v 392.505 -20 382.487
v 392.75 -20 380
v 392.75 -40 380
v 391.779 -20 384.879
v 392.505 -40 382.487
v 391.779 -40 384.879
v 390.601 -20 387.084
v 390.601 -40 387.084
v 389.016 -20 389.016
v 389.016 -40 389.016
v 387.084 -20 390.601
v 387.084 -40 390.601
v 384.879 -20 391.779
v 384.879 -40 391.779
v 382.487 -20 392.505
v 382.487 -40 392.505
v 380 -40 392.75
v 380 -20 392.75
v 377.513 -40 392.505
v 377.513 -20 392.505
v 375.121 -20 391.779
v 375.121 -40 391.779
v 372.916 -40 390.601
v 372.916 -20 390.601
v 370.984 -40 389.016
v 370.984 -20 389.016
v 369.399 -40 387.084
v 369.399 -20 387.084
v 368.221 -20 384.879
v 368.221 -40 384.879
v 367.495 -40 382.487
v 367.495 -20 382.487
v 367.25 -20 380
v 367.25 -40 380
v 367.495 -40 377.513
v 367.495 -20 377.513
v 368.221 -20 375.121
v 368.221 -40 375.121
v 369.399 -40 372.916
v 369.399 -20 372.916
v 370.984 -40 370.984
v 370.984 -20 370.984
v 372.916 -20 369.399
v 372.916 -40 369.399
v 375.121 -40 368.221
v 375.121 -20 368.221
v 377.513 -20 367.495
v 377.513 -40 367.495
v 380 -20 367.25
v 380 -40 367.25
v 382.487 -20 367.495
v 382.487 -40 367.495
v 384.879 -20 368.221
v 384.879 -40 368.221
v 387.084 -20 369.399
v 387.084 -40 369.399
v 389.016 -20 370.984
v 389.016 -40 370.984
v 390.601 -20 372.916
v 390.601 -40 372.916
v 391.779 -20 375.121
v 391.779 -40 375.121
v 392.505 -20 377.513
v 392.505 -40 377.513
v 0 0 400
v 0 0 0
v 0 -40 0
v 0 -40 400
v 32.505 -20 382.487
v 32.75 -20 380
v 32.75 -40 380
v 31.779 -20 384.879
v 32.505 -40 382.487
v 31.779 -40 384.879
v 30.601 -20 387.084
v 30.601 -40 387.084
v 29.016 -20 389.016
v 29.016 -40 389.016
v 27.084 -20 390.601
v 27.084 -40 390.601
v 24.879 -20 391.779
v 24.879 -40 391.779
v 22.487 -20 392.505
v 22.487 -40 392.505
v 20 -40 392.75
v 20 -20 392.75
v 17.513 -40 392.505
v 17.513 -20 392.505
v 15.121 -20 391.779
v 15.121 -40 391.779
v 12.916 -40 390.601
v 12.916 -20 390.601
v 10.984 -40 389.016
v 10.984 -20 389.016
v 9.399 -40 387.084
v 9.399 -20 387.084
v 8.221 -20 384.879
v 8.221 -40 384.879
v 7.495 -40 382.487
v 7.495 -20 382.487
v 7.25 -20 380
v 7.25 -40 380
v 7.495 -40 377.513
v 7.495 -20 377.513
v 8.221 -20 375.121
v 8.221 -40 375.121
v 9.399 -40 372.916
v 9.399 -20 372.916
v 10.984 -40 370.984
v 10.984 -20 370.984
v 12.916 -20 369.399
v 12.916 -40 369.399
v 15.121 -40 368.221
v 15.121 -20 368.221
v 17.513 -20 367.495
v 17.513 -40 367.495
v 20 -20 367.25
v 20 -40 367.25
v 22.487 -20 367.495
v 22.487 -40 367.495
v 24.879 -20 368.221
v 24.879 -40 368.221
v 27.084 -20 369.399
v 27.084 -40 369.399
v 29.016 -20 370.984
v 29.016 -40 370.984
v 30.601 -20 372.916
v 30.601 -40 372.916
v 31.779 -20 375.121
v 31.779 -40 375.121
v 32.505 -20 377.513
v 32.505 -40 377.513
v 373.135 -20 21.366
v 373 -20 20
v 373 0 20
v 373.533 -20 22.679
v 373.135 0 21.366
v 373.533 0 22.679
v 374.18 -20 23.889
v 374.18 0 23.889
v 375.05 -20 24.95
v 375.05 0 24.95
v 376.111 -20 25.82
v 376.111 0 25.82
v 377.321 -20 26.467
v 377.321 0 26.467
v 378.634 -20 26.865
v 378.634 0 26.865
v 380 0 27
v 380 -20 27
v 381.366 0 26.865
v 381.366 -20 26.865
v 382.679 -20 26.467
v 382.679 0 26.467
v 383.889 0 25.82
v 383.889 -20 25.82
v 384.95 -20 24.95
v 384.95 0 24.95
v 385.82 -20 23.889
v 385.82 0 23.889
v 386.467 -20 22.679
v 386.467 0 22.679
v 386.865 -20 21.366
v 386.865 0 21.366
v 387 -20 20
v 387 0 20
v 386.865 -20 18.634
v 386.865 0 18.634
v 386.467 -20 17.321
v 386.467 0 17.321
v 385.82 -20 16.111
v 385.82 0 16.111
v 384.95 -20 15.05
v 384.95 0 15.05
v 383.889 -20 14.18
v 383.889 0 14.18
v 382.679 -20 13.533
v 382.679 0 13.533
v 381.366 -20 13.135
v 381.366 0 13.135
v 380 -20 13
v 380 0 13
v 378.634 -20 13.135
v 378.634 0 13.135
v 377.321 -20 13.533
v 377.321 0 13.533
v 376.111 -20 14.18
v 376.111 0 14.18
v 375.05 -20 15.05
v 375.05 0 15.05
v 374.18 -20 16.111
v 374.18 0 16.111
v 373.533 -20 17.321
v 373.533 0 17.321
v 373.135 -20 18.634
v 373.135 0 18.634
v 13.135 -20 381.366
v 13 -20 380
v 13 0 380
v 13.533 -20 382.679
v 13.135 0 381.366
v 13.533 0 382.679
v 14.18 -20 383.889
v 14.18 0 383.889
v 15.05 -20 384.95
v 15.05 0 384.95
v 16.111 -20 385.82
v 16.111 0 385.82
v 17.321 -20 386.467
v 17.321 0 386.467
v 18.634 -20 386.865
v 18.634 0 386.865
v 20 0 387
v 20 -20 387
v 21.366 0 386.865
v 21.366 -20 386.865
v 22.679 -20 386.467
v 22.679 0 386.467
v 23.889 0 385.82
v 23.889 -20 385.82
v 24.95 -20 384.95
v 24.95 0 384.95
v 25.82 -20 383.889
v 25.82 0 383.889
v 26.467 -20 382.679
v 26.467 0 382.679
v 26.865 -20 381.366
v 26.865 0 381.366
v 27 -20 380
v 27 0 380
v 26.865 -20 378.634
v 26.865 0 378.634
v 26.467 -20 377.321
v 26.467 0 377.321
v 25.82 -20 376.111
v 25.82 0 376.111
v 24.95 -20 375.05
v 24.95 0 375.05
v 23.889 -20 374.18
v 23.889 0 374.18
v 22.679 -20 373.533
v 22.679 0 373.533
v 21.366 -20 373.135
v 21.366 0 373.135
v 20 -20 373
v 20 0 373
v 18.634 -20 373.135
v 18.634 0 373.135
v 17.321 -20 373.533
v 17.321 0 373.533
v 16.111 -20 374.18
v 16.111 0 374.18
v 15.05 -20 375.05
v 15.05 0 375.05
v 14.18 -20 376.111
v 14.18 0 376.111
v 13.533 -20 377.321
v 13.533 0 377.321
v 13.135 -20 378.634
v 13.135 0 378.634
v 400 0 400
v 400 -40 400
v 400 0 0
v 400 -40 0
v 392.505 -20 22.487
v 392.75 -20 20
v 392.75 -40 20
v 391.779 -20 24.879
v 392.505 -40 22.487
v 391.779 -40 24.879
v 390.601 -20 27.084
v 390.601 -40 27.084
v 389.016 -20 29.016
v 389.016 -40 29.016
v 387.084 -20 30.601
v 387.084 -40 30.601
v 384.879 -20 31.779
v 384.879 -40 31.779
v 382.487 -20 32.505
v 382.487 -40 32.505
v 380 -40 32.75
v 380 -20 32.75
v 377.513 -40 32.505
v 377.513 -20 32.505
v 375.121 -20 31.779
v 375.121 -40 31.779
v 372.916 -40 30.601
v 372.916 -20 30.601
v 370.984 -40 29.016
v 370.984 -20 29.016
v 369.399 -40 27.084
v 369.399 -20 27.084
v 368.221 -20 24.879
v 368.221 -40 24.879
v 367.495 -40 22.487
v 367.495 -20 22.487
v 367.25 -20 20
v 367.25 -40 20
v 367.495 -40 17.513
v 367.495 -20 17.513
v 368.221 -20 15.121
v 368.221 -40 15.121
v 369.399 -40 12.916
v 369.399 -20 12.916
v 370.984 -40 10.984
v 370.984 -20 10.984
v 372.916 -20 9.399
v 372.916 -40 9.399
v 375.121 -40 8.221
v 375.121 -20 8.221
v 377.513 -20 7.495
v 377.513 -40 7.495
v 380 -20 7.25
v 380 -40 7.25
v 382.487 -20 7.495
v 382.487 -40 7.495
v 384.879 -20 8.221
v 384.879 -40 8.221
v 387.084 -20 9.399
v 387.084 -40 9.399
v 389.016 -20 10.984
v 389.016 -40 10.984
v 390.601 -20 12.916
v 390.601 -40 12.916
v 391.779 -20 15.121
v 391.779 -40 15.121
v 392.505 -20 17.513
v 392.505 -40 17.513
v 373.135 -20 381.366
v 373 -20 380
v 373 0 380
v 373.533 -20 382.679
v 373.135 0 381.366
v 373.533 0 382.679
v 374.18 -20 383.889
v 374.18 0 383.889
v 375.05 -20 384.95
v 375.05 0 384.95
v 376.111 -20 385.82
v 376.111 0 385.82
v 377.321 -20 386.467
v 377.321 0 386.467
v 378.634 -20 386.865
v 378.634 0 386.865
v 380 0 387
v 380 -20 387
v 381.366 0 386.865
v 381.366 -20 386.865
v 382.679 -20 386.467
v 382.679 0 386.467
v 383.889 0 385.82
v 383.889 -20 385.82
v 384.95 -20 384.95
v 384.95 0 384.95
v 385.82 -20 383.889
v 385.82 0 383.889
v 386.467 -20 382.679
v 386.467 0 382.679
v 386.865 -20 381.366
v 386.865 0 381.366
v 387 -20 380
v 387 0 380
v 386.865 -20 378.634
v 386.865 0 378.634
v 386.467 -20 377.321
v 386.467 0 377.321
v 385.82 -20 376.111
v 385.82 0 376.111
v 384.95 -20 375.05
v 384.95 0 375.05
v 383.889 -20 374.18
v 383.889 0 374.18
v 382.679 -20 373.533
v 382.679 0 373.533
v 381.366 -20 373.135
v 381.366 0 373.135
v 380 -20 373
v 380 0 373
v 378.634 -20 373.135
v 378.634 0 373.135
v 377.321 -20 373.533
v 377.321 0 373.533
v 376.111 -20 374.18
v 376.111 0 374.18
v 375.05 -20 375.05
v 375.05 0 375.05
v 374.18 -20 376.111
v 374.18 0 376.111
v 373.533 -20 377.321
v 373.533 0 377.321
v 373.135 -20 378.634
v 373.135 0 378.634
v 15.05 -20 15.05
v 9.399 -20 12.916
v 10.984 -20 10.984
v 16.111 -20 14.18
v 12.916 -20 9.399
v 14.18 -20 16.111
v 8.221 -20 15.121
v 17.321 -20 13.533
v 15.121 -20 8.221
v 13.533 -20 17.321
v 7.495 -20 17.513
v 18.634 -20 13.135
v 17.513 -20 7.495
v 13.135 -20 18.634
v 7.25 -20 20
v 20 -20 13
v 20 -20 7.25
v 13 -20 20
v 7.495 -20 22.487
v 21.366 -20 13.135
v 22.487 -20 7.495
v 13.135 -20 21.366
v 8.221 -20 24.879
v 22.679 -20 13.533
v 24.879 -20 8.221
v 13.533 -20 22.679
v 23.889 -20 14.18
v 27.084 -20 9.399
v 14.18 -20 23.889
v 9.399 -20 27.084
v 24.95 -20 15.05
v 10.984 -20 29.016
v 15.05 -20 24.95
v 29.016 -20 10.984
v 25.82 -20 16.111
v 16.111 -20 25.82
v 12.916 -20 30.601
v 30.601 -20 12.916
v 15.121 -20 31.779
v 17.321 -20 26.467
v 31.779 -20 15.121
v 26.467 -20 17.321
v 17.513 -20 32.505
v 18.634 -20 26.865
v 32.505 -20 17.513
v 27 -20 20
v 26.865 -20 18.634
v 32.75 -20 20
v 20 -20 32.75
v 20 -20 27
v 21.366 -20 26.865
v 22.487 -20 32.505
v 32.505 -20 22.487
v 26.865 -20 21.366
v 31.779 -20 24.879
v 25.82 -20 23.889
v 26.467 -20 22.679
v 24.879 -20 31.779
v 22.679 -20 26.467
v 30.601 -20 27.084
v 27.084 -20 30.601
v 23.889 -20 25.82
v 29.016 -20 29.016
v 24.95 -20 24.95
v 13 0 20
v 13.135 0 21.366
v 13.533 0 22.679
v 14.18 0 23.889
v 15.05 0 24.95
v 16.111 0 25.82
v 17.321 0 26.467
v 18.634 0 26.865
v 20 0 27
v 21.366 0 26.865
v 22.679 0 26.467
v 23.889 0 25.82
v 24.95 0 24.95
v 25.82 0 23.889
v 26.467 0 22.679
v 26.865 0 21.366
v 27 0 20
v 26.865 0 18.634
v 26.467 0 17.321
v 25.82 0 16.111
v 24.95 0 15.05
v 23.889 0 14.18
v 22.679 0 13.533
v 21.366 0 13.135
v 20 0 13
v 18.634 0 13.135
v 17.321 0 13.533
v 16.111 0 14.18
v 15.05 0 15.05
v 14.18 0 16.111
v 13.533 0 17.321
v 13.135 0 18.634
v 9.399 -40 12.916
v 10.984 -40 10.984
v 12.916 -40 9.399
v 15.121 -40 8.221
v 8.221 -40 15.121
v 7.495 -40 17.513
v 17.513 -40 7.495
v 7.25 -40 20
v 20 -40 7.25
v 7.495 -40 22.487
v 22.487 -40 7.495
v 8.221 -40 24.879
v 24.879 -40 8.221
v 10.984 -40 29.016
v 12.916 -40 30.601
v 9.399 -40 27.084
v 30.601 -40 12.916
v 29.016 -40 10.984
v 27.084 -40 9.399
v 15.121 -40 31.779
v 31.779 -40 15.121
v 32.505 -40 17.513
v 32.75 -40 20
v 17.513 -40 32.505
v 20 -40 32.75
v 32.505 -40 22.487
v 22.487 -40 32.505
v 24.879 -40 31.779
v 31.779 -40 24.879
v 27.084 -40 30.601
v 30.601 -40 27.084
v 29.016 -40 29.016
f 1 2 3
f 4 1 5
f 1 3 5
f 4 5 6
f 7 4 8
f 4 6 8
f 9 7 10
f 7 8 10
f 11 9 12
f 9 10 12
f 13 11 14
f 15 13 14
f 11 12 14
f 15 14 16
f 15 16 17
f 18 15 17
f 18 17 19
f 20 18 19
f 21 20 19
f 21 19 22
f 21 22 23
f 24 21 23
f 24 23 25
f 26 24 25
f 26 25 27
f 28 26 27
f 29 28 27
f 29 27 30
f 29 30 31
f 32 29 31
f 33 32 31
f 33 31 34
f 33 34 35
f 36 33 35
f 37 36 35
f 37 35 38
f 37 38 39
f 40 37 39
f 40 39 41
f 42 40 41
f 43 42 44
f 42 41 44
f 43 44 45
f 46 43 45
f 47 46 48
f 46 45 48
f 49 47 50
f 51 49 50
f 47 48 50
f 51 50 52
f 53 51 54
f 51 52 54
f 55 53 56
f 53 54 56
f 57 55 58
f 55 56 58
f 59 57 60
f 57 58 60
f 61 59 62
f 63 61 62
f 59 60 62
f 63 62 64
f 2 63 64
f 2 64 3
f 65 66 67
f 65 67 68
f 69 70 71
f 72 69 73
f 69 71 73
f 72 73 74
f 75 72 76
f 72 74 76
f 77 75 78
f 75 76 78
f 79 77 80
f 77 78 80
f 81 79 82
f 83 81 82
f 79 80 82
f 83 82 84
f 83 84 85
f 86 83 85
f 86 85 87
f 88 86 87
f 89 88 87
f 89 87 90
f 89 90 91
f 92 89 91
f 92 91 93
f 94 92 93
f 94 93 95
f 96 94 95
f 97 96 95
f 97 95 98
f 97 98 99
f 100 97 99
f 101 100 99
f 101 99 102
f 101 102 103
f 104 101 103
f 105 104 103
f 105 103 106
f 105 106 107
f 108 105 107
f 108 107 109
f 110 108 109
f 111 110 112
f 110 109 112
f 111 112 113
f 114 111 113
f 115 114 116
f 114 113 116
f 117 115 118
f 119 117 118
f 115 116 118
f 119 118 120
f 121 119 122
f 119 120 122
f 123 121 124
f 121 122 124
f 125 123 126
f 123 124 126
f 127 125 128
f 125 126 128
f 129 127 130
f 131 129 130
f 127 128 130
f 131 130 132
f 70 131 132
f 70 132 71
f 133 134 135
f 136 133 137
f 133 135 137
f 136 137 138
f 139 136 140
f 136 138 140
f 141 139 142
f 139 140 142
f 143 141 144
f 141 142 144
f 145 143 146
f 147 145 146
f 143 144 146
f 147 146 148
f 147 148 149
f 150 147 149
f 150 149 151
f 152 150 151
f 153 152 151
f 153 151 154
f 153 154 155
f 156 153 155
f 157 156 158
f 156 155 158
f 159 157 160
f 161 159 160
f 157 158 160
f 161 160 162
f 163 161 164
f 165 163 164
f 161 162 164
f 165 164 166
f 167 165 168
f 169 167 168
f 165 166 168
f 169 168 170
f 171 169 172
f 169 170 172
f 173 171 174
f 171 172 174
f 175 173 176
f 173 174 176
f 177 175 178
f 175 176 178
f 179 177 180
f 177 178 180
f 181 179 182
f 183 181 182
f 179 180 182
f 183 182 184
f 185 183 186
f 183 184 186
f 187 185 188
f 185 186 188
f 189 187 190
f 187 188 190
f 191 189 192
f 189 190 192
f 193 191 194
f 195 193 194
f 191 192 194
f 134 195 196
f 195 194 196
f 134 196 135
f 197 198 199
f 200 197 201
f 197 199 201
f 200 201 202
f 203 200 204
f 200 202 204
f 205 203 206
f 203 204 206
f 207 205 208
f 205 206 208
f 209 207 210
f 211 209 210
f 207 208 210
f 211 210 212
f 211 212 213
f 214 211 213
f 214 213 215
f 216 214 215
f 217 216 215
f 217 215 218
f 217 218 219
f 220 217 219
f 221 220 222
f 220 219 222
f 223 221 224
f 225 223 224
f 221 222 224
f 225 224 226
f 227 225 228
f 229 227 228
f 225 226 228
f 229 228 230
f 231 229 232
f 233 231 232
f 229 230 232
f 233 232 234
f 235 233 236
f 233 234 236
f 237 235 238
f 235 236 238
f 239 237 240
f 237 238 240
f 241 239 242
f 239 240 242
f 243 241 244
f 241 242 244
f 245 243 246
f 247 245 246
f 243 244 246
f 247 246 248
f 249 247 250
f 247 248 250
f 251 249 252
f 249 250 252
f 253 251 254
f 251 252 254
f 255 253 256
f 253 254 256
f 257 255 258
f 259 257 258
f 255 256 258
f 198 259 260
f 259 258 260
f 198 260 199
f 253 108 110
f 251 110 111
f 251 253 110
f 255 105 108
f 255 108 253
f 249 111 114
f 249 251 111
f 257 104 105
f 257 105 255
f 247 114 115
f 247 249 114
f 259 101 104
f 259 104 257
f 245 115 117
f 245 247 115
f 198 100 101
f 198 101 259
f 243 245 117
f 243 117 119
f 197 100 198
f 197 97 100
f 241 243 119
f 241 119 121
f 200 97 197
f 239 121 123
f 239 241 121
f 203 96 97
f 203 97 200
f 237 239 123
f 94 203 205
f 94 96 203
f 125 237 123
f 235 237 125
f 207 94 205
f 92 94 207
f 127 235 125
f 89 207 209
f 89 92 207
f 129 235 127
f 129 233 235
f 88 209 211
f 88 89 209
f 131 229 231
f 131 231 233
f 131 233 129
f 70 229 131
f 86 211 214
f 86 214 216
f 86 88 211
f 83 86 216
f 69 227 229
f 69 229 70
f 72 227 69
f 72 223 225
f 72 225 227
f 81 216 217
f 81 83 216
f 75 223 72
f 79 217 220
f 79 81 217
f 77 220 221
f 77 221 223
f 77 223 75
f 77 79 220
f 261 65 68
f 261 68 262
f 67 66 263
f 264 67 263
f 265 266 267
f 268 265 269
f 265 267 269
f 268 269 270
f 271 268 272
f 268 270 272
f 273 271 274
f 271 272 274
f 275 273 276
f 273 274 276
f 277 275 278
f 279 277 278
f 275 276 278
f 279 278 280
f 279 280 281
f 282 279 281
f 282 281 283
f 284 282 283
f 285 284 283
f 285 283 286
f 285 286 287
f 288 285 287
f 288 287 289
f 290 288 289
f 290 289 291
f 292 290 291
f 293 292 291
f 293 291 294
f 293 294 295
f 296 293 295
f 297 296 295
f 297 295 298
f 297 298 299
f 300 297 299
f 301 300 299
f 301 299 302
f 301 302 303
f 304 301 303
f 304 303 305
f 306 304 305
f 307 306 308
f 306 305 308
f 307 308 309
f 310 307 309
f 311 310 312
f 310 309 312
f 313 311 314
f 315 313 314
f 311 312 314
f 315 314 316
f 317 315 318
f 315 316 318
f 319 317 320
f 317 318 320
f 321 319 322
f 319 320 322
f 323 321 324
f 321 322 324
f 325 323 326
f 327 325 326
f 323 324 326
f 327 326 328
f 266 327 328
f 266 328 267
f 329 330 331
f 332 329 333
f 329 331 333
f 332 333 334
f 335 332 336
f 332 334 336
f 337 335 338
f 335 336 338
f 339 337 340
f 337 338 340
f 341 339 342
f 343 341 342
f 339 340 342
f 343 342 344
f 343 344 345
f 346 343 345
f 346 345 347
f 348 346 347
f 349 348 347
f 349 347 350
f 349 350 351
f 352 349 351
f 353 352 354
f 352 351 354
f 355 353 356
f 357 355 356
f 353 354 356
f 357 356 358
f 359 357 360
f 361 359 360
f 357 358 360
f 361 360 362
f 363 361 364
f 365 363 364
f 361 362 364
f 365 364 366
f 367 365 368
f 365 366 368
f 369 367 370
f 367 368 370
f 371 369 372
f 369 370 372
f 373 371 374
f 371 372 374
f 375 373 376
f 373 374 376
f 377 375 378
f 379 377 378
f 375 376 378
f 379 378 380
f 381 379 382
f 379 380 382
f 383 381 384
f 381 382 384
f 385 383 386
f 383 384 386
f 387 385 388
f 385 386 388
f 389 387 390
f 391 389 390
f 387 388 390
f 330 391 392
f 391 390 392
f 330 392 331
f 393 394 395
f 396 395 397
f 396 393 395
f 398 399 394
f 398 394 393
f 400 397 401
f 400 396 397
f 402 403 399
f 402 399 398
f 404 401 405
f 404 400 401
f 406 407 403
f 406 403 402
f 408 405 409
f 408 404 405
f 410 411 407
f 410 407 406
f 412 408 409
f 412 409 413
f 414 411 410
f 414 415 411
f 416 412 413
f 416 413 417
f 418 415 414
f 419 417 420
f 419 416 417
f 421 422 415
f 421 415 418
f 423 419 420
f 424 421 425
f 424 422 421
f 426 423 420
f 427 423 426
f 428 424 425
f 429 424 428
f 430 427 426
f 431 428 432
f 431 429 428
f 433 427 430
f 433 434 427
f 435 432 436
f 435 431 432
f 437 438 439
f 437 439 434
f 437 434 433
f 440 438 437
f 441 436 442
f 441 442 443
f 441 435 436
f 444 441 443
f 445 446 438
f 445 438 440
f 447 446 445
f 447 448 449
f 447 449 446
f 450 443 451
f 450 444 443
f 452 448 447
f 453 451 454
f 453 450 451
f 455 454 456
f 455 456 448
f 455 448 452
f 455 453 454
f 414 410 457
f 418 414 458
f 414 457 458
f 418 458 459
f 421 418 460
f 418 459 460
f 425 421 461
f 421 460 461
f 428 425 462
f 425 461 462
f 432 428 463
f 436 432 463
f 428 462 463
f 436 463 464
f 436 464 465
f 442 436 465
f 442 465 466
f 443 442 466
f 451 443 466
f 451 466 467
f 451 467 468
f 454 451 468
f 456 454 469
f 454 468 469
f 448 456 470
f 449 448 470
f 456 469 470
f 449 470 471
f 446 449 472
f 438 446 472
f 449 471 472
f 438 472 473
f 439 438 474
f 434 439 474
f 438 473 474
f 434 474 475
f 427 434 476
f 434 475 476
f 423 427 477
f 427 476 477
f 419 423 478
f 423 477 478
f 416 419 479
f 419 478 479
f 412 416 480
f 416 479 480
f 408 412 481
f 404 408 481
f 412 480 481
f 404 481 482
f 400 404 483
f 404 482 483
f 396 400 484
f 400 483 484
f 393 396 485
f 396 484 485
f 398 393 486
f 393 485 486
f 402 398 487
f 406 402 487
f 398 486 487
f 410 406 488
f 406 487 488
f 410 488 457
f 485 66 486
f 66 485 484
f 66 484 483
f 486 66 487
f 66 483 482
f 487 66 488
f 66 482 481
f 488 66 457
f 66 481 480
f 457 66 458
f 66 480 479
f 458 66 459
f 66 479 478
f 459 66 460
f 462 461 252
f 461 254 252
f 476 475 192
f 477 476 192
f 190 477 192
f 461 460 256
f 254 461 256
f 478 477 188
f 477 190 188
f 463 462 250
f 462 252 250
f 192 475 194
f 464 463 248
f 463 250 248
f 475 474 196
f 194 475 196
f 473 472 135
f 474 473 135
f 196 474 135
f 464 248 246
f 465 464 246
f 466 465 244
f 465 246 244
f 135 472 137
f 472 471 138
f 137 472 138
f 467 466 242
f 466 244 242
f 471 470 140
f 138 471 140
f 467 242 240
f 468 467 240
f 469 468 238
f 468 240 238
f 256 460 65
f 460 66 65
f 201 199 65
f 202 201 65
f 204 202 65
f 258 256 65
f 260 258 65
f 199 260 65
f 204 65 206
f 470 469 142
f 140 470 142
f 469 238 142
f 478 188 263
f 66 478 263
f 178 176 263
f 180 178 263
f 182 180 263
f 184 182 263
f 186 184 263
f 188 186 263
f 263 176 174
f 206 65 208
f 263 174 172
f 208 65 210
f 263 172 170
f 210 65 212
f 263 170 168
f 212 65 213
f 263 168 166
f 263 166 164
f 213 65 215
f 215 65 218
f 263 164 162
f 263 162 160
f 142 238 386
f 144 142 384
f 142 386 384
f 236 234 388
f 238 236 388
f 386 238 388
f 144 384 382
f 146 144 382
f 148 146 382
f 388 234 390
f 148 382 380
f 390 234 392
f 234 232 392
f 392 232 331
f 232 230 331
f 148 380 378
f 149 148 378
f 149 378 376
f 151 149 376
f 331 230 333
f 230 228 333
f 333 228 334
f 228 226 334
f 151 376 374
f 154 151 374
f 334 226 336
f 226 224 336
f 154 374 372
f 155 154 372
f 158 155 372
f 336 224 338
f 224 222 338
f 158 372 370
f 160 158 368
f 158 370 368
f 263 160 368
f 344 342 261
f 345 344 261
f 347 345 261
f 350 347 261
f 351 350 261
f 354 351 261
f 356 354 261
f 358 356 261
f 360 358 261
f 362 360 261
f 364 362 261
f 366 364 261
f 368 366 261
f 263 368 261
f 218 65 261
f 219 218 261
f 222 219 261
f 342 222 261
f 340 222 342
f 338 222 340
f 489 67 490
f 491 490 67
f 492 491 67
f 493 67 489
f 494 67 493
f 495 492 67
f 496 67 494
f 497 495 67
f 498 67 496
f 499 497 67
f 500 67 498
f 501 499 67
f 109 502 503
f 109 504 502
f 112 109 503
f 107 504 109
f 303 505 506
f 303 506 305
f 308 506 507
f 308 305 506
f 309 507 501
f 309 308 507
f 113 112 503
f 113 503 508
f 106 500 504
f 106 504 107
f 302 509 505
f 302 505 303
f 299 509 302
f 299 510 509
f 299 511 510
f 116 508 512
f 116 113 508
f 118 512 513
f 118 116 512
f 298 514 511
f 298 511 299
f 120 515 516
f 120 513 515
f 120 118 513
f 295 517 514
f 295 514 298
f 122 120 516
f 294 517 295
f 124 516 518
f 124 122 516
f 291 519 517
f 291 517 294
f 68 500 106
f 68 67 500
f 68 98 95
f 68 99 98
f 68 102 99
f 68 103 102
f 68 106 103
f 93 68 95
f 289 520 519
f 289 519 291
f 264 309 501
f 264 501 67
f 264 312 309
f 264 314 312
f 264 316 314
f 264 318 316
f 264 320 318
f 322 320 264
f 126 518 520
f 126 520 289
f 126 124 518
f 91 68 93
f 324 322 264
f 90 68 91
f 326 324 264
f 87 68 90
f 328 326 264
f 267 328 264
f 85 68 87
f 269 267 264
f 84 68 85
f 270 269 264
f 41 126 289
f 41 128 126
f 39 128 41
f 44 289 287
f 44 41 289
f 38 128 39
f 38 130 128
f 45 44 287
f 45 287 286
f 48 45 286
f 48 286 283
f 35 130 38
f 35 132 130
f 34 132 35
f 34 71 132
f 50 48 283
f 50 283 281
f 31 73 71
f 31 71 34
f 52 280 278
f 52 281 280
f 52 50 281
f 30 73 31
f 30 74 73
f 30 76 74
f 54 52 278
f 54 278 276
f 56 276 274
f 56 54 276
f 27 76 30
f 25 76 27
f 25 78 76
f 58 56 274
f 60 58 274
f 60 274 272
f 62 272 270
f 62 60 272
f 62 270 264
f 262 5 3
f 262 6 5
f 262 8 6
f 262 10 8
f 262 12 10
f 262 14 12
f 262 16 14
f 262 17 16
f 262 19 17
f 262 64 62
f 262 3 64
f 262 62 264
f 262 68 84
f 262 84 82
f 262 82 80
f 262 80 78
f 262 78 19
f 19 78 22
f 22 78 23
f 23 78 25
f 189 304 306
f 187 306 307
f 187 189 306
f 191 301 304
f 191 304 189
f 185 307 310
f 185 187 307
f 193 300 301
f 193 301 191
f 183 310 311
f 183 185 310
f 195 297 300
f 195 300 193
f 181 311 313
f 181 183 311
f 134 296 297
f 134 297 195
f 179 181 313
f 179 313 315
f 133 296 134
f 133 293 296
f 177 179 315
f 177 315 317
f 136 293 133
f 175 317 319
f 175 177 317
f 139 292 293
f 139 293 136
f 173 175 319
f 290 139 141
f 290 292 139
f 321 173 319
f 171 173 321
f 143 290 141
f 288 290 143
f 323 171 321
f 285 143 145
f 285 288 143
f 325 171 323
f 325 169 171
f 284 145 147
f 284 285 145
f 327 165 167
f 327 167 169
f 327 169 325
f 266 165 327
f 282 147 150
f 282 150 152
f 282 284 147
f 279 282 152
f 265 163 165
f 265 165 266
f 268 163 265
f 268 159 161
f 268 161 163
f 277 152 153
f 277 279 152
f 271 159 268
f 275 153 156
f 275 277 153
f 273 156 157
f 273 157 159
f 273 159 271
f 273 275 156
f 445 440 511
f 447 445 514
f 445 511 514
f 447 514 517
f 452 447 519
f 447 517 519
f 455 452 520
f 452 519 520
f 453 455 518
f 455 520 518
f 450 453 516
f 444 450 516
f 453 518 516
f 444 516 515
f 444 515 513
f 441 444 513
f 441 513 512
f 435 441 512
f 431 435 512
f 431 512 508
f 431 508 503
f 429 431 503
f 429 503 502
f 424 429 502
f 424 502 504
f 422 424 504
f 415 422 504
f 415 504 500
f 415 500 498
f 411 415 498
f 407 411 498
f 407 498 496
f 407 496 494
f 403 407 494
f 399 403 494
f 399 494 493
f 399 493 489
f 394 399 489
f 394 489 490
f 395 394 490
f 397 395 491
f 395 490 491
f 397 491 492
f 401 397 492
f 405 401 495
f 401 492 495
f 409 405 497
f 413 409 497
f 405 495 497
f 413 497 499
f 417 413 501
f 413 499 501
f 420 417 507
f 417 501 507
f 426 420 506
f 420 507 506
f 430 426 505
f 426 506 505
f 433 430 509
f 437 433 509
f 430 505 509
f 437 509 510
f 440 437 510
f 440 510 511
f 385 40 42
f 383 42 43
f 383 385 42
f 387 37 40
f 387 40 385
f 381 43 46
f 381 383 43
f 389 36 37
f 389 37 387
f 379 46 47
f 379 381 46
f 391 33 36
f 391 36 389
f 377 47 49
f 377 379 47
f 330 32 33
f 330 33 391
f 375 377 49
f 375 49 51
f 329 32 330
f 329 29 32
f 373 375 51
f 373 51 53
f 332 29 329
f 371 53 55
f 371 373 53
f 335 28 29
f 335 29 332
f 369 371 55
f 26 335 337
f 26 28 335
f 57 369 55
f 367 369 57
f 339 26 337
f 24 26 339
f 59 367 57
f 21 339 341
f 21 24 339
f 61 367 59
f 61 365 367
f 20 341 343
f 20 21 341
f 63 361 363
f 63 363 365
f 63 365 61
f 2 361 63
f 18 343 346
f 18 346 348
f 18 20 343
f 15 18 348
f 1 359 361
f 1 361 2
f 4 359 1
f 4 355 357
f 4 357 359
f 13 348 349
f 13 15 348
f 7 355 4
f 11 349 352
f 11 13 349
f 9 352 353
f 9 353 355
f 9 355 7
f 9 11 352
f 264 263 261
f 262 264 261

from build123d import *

# Parameters (mm, degrees)
F0_W           = 400
F0_H           = 400
F1_DEPTH       = 40
F3_D           = 14
F3_CBORE_D     = 25.5
F3_CBORE_DEPTH = 20


with BuildPart() as f1:
    # F0 (on Front) → F1 (new body)
    with BuildSketch(Plane.XZ):
        with Locations((200, 200)):
            Rectangle(F0_W, F0_H)
    extrude(amount=F1_DEPTH)

    # F3 (through all)
    with Locations(Plane.XZ.offset(40)):
        with Locations((20, 380), (380, 380), (380, 20), (20, 20)):
            CounterBoreHole(F3_D / 2, F3_CBORE_D / 2, F3_CBORE_DEPTH)


solid = f1.part
